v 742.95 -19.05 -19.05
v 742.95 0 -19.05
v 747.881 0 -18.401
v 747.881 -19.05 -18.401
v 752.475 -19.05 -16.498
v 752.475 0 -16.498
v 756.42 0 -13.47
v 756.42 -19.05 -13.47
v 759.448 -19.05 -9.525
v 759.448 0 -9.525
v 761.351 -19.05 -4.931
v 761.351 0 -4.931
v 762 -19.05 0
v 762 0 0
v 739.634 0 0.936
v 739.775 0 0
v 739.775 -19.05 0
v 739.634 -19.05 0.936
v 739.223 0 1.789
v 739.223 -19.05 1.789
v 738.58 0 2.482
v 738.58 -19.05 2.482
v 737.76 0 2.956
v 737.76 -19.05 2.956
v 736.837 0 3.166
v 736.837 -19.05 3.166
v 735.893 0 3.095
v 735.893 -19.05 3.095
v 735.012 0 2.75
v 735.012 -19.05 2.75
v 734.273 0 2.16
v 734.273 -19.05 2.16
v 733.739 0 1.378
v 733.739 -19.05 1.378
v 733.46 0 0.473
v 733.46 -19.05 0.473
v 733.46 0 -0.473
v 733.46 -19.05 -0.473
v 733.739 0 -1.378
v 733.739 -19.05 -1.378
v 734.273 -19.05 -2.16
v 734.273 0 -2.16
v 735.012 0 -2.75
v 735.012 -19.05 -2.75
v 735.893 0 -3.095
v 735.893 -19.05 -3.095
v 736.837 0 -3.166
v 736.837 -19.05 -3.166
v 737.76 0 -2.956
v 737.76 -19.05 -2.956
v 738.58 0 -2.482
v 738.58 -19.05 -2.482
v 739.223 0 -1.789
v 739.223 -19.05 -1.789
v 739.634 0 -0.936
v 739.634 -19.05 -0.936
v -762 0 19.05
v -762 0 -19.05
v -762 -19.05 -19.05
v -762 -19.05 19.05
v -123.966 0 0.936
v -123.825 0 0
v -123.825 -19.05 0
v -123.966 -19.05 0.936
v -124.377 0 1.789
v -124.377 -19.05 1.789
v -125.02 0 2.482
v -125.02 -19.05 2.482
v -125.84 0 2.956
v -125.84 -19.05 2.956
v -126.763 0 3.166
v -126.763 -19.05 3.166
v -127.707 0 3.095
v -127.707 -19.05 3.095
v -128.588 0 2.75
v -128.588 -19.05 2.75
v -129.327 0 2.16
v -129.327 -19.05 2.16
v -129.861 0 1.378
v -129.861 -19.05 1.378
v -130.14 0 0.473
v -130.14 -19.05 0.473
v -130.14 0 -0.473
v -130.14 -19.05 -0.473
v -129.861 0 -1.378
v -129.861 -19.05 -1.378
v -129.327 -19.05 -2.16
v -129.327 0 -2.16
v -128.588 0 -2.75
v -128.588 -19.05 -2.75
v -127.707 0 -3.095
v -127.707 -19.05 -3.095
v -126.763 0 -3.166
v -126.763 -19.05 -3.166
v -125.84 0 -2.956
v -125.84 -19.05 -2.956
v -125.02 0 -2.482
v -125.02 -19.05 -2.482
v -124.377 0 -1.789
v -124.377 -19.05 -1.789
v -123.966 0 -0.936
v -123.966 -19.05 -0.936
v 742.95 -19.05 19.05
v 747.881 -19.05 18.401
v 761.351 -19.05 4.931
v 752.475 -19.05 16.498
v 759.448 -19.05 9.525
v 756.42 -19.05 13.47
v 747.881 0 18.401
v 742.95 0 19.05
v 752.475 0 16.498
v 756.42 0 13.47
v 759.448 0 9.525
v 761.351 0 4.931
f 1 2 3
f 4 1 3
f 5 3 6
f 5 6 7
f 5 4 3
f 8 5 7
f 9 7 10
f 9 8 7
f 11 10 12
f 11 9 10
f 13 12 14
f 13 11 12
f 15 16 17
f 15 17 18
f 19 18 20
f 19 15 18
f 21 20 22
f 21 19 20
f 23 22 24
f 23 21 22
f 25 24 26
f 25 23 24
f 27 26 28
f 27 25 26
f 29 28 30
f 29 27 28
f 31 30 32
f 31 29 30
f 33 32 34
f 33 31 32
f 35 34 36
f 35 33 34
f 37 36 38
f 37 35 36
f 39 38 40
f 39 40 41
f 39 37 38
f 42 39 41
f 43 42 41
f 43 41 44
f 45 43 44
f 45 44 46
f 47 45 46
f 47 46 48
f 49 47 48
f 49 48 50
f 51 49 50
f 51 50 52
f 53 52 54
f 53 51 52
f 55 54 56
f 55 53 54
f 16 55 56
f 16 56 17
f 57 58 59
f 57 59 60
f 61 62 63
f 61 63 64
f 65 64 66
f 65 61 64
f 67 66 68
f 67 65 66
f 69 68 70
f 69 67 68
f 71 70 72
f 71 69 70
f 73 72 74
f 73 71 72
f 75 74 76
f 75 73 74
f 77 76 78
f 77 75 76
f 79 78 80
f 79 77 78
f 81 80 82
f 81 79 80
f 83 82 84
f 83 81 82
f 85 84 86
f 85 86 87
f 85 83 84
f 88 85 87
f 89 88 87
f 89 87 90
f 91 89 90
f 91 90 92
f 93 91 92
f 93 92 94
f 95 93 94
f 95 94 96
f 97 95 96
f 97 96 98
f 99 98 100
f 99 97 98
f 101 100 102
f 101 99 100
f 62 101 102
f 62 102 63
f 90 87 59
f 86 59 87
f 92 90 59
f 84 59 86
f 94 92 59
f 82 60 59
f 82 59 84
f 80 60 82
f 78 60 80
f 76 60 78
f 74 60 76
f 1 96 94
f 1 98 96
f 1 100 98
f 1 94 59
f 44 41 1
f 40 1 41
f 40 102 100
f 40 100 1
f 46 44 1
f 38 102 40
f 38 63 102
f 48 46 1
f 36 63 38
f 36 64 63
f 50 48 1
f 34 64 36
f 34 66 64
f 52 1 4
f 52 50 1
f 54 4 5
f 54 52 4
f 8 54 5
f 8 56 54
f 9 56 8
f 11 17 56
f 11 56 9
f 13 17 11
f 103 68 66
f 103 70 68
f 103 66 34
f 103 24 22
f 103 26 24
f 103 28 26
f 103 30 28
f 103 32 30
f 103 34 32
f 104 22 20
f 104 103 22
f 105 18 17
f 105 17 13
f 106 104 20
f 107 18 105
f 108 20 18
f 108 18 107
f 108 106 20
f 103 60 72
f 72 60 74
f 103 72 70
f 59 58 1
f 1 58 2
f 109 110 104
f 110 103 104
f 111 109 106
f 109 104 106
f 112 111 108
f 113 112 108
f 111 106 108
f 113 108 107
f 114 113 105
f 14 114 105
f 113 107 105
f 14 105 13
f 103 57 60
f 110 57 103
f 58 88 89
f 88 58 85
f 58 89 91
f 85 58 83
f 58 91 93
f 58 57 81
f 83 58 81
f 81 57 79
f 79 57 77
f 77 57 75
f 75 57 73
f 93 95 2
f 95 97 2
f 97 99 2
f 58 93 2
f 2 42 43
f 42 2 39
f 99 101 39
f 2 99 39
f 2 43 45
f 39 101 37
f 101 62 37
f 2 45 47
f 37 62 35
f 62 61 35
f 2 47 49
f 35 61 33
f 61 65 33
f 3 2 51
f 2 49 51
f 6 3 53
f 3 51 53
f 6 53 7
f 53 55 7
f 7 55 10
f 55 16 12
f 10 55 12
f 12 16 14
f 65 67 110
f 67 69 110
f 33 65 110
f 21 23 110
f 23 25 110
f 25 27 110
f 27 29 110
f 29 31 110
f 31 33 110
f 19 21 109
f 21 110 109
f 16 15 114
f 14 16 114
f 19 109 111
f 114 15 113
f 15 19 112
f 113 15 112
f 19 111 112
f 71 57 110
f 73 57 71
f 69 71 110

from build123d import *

# Parameters (mm, degrees)
F0_W     = 1524
F0_H     = 38.1
F0_R     = 3.175
F1_DEPTH = 19.05
F2_R     = 19.04999


# Not quite as in the source:
# - a fillet or chamfer is up to 0.001 mm smaller than in the source, because OpenCascade refuses the exact size


with BuildPart() as f1:
    # F0 (on Front) → F1 (new body)
    with BuildSketch(Plane.XZ):
        Rectangle(F0_W, F0_H)
        with Locations((-127, 0)):
            Circle(F0_R, mode=Mode.SUBTRACT)
        with Locations((736.6, 0)):
            Circle(F0_R, mode=Mode.SUBTRACT)
    extrude(amount=F1_DEPTH)

    # F2 (radius 19.05 in the source; OpenCascade refuses exactly that, so slightly less here)
    f2_edges = [f1.edges().sort_by_distance(p)[0] for p in [
        (762, -9.525, 19.05),
        (762, -9.525, -19.05),
    ]]
    fillet(f2_edges, radius=F2_R)


solid = f1.part
